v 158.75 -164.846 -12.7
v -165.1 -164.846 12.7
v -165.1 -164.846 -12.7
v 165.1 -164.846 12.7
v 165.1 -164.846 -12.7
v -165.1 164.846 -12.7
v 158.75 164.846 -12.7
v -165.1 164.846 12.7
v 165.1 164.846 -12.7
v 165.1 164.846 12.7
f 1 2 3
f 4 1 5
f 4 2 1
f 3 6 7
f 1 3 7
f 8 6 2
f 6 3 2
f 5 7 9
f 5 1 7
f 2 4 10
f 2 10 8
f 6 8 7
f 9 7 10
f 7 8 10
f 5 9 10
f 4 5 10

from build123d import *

# Parameters (mm, degrees)
F0_W     = 317.5
F0_H     = 25.4
F0_W_2   = 6.35
F1_DEPTH = 164.846


# Not quite as in the source:
# - ends of sketch curves that miss each other by under 0.0002 mm in the source are joined


with BuildPart() as f1:
    # F0 (on Front) → F1 (new body, symmetric)
    with BuildSketch(Plane.XZ):
        Rectangle(F0_W, F0_H)
        Polygon((165.1, 12.7), (158.75, 12.7), (158.75, -12.7), (165.1, -12.6999953677), align=None)
        with Locations((-161.925, 0)):
            Rectangle(F0_W_2, F0_H)
    extrude(amount=F1_DEPTH, both=True)


solid = f1.part
